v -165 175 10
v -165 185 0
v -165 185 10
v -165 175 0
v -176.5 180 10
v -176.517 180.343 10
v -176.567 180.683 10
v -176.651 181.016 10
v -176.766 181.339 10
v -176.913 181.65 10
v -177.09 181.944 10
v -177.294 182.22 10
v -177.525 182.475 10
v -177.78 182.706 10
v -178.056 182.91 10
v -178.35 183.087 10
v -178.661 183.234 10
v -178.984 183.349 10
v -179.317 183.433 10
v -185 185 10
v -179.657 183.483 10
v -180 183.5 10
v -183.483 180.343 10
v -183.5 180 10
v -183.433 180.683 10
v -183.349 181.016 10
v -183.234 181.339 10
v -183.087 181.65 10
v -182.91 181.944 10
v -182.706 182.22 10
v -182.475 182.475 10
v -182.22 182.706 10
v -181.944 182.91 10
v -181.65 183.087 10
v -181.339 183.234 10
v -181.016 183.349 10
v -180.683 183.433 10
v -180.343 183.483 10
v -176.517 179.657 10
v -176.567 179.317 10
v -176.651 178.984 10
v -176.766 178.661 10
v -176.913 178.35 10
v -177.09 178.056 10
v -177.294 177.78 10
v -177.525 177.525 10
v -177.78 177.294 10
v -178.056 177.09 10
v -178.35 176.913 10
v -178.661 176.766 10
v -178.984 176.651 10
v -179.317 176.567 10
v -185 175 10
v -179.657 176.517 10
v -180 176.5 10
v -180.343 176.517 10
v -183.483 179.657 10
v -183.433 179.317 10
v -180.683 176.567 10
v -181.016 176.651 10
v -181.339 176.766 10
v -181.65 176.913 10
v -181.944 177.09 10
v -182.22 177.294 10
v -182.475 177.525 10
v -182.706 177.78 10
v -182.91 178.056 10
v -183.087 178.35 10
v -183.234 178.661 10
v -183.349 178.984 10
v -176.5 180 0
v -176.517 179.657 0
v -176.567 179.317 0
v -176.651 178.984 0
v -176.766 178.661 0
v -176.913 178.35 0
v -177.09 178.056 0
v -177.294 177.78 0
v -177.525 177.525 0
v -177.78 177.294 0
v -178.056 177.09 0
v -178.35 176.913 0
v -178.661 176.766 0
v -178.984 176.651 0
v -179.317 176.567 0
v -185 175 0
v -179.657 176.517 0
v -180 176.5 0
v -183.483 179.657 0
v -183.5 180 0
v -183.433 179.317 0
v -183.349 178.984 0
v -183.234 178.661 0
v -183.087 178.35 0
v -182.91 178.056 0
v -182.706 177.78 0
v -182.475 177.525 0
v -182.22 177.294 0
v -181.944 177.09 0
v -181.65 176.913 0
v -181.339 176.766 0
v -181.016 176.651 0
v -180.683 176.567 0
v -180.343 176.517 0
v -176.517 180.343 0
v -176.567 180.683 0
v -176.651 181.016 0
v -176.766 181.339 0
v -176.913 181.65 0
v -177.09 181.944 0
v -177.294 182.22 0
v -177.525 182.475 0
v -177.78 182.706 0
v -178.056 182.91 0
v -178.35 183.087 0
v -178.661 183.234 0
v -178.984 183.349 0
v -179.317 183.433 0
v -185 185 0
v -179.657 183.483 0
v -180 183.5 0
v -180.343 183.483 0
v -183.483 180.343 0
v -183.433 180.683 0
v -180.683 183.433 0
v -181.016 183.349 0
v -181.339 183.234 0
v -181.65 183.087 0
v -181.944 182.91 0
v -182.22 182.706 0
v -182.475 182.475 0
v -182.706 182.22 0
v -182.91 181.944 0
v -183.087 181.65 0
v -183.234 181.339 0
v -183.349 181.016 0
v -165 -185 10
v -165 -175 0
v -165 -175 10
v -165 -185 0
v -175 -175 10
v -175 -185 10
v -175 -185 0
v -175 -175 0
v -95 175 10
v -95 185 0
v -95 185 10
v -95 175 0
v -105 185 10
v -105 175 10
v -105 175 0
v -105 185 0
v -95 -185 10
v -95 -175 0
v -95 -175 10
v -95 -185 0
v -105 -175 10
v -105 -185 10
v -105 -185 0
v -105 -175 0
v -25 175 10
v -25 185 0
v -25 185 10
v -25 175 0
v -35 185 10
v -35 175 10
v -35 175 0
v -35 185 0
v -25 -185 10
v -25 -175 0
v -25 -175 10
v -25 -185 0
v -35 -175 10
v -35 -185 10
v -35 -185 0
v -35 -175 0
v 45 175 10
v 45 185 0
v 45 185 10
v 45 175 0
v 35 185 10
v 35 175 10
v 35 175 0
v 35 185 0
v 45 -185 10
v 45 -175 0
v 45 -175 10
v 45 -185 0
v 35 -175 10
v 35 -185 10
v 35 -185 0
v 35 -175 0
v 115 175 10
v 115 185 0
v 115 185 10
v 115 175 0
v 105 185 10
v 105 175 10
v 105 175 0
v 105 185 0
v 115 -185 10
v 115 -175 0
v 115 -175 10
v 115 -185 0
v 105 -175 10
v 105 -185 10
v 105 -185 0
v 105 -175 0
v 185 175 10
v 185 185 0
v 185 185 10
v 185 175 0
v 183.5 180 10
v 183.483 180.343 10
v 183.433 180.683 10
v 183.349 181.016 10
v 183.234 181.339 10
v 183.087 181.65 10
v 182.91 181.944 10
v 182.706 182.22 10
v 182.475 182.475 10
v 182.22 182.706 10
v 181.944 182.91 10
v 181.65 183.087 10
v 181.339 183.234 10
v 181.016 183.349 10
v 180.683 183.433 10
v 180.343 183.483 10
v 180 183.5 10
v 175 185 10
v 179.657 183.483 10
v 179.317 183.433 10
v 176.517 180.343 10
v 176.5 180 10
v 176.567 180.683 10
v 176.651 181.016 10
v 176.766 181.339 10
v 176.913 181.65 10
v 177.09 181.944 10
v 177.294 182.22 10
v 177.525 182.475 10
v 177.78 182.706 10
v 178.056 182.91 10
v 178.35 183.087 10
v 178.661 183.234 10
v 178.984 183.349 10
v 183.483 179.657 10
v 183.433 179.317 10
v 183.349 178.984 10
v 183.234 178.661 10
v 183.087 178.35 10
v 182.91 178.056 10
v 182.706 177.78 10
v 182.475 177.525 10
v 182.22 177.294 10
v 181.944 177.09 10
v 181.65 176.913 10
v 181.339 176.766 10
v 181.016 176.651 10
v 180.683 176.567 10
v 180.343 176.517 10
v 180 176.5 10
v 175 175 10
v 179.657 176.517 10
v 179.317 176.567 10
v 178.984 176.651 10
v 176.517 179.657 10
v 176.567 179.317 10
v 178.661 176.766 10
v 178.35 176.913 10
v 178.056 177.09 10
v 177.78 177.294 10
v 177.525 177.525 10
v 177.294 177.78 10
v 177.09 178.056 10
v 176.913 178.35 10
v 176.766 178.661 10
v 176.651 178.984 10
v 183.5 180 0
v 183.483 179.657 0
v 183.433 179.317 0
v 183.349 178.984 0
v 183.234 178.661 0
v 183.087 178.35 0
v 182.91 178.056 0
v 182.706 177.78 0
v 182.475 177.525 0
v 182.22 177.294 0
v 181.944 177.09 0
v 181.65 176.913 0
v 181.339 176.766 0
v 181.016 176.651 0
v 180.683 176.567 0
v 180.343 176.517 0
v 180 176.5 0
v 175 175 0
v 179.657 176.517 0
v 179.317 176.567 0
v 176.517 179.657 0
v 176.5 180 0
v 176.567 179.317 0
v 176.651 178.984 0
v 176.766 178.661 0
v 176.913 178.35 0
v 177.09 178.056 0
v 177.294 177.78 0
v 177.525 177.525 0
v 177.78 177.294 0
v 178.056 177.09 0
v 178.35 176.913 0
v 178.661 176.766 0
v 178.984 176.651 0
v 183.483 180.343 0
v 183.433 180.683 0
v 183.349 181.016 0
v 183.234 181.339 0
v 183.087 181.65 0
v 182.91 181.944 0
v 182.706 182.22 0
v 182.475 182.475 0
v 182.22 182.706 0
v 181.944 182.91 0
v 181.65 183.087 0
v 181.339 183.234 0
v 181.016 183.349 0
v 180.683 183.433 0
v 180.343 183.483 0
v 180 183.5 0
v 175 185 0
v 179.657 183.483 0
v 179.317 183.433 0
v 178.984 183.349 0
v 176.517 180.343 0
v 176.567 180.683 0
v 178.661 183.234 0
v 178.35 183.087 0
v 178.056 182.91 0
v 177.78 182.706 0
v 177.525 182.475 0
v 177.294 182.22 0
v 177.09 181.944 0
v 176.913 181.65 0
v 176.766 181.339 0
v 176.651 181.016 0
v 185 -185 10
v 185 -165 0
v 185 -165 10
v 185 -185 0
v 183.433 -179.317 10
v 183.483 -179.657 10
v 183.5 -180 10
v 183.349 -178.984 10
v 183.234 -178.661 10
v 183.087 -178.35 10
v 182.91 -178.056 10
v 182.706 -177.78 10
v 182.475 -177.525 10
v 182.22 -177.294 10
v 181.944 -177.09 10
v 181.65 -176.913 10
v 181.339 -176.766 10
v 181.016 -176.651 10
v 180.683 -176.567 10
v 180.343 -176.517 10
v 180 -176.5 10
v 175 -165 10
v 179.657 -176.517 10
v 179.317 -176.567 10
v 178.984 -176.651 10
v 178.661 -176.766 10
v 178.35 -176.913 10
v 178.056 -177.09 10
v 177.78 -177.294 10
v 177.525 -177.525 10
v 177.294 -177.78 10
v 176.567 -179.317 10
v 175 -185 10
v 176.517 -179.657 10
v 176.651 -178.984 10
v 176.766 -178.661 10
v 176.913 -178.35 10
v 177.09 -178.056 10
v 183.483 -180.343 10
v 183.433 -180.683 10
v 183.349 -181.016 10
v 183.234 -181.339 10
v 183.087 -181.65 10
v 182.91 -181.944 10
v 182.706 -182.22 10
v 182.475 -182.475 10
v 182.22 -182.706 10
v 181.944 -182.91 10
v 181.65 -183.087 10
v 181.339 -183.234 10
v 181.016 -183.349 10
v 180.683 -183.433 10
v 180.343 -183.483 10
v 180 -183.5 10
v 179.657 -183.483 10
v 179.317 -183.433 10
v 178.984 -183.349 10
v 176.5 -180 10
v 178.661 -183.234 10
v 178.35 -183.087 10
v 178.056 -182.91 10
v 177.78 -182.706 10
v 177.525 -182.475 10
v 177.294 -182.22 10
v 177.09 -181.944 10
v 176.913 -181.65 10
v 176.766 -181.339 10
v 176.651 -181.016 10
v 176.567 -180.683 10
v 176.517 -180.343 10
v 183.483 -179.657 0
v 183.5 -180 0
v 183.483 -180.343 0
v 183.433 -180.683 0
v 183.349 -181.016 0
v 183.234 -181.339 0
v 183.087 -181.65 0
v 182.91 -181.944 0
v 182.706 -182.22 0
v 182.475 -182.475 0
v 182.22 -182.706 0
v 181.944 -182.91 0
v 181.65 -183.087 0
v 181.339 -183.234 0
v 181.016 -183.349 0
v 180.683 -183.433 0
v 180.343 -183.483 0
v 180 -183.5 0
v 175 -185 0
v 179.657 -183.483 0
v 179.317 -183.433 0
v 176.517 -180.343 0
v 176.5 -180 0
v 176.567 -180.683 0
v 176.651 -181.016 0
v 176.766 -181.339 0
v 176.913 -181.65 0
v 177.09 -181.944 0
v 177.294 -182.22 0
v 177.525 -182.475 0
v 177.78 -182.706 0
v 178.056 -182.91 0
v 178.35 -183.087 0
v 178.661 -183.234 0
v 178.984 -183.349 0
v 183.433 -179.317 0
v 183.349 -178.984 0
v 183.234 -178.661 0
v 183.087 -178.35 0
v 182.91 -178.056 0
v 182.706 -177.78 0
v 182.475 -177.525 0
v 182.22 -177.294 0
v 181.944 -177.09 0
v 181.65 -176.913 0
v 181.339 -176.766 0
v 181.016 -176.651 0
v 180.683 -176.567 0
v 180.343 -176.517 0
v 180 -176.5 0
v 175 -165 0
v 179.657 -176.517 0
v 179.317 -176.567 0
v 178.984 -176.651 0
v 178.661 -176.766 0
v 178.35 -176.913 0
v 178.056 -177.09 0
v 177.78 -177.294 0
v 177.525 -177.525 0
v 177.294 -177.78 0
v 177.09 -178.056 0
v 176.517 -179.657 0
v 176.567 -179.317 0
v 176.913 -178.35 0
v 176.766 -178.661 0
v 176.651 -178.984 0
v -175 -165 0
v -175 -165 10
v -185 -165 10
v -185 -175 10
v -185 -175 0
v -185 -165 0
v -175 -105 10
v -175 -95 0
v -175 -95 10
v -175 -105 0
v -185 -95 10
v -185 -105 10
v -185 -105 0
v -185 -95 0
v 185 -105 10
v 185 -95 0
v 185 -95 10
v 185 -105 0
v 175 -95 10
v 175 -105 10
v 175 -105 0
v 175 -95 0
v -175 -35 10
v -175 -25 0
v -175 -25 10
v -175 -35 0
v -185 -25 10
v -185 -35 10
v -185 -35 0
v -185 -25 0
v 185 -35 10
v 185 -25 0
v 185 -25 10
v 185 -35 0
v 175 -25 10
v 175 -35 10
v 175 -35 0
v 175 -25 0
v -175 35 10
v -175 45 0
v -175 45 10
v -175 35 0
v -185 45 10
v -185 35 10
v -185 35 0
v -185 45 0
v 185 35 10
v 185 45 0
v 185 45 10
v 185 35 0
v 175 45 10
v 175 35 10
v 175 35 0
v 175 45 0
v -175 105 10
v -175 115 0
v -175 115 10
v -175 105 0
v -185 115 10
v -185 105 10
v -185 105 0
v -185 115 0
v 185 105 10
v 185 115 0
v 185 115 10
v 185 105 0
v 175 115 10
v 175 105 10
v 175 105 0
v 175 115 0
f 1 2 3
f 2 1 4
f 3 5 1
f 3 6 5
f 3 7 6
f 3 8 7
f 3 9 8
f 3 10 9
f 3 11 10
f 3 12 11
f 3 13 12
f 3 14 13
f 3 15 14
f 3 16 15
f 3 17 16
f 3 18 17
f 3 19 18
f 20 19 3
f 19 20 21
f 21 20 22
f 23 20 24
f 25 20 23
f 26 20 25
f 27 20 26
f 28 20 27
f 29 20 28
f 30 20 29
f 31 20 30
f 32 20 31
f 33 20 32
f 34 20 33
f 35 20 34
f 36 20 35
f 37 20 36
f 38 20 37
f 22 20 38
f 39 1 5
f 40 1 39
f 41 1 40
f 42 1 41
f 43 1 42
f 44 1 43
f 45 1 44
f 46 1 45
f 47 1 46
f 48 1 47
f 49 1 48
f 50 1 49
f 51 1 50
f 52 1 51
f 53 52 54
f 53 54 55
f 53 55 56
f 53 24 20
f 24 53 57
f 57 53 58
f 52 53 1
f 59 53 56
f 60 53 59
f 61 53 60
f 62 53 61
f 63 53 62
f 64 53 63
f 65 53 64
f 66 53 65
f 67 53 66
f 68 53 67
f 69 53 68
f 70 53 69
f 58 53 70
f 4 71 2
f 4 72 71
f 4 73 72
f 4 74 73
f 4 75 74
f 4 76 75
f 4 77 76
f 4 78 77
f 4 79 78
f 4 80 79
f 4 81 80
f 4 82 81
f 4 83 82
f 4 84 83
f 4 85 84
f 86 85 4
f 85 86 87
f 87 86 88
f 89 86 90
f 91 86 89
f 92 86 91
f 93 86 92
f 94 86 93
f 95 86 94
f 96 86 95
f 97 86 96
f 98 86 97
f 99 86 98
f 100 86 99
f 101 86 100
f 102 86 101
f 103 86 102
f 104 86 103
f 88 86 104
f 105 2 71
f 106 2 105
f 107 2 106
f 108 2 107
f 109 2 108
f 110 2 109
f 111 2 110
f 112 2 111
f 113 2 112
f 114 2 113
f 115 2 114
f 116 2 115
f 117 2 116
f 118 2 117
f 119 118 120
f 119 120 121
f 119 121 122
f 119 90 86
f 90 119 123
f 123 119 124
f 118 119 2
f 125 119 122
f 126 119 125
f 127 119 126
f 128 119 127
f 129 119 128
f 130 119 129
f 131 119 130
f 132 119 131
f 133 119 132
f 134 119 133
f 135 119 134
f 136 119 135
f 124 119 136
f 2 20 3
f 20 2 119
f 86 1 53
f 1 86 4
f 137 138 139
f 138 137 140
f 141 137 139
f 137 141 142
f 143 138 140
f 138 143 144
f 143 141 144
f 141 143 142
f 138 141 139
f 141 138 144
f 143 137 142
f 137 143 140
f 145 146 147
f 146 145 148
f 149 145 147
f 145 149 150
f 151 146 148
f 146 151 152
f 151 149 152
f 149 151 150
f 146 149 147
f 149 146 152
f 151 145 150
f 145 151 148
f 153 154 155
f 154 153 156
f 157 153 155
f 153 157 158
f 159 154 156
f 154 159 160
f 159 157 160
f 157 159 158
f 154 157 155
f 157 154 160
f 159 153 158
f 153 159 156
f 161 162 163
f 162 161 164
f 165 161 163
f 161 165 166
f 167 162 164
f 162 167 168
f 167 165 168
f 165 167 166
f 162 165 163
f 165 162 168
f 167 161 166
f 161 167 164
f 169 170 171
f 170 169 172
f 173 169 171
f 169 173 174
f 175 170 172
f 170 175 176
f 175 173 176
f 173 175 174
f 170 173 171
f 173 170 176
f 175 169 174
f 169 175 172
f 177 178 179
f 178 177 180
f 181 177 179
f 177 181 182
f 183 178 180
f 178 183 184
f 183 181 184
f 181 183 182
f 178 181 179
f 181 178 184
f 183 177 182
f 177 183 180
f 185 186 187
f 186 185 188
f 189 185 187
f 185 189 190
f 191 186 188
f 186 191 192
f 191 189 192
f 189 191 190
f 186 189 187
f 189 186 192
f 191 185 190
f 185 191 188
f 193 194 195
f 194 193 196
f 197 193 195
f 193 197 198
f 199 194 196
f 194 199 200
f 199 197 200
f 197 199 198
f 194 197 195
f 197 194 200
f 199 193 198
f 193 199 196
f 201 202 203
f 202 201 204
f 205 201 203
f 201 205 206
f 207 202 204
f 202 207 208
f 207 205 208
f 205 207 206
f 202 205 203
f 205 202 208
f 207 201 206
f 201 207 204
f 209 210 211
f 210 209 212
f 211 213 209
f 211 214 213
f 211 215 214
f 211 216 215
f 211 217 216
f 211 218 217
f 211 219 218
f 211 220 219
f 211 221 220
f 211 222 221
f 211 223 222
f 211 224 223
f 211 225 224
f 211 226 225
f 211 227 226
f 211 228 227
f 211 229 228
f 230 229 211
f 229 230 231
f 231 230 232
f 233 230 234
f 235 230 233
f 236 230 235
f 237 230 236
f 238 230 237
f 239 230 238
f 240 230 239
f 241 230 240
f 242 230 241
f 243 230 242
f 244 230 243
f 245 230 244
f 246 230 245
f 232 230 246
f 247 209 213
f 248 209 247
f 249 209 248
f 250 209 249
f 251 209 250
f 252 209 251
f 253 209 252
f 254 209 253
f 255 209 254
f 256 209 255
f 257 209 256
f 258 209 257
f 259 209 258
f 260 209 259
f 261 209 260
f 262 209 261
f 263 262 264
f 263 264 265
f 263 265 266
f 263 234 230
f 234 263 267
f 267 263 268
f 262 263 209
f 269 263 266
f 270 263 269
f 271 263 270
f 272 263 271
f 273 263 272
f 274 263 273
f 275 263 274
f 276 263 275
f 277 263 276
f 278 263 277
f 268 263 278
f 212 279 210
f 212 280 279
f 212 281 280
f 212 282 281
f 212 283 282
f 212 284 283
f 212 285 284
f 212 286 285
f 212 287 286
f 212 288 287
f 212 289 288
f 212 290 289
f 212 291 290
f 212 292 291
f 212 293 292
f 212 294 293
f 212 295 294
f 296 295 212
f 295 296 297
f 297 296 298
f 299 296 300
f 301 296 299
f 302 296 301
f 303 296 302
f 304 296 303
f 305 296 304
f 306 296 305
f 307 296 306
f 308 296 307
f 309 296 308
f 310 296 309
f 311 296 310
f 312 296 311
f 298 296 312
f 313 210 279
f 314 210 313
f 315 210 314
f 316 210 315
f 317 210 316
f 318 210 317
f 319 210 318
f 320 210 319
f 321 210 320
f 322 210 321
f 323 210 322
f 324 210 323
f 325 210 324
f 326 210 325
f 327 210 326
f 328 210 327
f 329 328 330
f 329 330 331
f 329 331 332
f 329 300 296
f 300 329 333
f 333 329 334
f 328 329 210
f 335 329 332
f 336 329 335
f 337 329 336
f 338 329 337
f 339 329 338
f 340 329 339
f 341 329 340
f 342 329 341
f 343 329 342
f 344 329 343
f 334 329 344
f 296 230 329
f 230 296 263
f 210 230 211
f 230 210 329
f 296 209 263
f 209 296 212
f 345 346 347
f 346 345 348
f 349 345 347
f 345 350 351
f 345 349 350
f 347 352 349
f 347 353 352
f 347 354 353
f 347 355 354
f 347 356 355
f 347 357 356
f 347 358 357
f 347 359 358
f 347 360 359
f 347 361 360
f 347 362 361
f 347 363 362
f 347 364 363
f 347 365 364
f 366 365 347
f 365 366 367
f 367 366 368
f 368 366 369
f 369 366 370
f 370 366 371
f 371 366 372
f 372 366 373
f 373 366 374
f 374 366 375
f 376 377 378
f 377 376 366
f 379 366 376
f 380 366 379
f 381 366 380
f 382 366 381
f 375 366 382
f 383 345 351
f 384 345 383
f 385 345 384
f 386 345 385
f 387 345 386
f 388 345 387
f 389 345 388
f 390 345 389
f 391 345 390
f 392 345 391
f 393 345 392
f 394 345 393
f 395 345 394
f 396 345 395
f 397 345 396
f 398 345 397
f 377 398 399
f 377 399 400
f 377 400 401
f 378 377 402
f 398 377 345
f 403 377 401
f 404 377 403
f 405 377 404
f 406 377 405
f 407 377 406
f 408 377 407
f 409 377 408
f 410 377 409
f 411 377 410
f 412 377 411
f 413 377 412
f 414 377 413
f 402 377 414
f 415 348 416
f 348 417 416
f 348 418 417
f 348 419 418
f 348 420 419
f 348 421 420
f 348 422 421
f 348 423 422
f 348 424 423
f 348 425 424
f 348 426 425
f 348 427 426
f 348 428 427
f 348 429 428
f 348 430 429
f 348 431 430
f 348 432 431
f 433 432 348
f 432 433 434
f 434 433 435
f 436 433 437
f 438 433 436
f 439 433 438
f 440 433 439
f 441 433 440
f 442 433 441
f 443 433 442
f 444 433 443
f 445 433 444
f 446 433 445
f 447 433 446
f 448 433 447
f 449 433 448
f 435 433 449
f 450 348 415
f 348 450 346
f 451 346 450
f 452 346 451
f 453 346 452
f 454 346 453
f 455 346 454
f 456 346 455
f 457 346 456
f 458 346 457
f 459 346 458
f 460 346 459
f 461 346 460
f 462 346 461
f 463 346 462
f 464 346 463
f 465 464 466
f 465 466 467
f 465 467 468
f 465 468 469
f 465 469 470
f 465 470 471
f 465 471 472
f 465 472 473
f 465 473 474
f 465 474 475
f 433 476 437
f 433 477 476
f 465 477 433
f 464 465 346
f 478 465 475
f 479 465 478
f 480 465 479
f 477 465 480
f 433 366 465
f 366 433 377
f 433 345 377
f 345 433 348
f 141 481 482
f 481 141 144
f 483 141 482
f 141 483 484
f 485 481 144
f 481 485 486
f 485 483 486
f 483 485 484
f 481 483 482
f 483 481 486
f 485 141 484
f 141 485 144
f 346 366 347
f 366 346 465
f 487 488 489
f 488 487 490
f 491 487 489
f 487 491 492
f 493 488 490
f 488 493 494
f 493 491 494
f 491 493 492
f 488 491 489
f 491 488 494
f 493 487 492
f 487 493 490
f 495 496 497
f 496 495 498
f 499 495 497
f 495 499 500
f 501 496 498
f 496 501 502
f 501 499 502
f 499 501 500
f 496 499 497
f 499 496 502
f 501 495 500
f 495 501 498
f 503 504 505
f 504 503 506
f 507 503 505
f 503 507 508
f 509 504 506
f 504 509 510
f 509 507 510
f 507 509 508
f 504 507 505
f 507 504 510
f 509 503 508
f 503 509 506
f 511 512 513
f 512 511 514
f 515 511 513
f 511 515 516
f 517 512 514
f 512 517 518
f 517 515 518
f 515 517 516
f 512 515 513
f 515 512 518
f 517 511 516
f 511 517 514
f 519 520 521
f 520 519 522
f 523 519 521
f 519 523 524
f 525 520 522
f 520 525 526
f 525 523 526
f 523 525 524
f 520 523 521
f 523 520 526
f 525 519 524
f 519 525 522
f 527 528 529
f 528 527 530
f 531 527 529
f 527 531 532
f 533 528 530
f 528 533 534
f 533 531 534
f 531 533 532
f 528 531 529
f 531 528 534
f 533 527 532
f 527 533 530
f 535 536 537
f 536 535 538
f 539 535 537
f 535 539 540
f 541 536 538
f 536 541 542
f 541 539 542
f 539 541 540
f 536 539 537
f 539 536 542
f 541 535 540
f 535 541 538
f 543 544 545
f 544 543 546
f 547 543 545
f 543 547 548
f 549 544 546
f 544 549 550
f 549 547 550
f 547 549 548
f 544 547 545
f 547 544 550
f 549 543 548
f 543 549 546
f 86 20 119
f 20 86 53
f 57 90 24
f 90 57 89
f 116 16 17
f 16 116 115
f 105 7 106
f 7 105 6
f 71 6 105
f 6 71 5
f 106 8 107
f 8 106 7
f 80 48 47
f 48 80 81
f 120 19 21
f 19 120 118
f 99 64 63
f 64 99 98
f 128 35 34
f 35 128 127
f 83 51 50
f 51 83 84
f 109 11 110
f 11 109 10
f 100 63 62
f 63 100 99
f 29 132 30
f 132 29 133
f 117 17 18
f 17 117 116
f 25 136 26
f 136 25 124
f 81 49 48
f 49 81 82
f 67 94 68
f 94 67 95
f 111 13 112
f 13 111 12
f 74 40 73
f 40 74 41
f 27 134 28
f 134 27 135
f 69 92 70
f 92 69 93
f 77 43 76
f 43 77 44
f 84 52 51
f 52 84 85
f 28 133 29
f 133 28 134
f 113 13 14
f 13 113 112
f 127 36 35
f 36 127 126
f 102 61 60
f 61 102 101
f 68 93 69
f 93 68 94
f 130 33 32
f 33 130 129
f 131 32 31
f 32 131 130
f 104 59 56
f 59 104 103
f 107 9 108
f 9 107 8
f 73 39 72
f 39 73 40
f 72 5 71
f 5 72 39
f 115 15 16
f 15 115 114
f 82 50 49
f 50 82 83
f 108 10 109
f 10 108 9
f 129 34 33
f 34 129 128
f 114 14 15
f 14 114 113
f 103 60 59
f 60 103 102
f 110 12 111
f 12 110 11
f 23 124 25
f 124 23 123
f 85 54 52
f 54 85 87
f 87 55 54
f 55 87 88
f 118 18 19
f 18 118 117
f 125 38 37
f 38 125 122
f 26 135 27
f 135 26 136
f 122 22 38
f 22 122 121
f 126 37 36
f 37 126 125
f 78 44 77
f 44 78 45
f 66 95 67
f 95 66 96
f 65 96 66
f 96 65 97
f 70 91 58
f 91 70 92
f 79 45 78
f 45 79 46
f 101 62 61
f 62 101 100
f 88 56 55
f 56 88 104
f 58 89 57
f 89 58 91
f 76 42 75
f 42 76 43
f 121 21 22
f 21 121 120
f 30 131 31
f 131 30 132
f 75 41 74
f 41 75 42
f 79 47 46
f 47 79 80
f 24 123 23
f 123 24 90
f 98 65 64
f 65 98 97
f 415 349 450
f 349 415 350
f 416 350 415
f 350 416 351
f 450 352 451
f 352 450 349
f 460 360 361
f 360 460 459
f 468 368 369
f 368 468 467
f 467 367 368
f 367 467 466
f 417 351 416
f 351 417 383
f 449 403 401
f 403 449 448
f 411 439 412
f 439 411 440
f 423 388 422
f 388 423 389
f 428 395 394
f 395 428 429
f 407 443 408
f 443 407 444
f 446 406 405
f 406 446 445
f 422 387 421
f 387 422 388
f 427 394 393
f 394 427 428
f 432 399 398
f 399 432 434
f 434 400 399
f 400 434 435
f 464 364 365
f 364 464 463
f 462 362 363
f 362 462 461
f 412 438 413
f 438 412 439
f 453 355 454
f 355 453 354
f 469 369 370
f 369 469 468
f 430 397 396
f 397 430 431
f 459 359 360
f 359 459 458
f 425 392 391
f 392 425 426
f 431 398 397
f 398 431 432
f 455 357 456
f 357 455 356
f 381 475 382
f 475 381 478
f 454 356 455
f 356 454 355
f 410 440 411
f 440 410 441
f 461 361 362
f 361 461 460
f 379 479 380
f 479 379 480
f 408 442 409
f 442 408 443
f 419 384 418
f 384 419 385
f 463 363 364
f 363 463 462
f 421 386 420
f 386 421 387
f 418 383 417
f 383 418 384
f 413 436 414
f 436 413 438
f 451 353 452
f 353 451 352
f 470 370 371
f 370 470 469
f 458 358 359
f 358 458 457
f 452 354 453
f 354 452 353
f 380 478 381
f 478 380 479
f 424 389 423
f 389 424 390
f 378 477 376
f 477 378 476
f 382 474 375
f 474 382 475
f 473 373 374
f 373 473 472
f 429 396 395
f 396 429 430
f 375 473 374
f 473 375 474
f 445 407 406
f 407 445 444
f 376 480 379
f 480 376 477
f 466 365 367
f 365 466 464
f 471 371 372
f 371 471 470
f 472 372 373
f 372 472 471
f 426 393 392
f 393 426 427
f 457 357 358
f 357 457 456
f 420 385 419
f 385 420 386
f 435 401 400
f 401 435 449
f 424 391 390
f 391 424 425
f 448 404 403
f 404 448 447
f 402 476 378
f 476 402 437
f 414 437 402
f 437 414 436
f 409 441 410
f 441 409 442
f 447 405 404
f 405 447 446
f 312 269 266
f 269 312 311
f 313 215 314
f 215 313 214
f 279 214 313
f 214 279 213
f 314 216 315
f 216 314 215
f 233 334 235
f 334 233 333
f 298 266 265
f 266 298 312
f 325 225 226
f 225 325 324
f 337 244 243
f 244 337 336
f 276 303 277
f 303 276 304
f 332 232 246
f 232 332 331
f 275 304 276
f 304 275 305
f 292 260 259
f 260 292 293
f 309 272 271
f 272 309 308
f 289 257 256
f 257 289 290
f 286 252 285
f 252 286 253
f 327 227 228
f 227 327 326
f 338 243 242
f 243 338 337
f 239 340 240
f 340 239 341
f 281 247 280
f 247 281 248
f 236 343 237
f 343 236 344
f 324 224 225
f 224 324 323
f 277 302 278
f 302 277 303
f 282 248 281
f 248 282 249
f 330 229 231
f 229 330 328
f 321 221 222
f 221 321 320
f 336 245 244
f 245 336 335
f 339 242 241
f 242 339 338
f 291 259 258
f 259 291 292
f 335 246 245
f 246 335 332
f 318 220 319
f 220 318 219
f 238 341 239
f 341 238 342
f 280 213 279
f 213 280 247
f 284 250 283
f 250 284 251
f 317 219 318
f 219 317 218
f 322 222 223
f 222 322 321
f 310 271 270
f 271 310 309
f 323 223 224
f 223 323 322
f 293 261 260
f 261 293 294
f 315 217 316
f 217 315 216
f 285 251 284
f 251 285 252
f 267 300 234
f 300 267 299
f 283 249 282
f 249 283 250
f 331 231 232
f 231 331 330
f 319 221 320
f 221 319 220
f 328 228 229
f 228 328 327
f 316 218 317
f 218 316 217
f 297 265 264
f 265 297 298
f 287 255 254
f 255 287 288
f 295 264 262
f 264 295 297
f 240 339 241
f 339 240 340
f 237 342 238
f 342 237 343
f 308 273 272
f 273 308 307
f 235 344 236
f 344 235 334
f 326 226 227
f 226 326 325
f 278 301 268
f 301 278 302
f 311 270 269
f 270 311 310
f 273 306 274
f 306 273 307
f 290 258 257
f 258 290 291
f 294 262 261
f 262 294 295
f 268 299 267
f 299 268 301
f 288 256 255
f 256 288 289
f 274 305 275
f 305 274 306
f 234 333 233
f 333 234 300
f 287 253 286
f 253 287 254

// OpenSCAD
// ring_65.scad - ring index 65 (z bottom = 650 mm)
$fn = 64; bar = 10; half_b = bar/2; outer = 370; half_outer = outer/2;
front_y = 180; back_y = -180; left_x = -180; right_x = 180;
x_centers = [-170, -100, -30, 40, 110, 180];
z_centers = [5, 85, 155, 225, 295, 365, 435, 505, 575, 645, 715]; ring_z = 650;
module place_box(cx, cy, sx, sy) { translate([cx - sx/2, cy - sy/2, 0]) cube([sx, sy, bar]); }

difference() { union() {
    for (x = x_centers) { place_box(x, front_y, bar, bar); place_box(x, back_y, bar, bar); }
    for (y = x_centers) { place_box(left_x, y, bar, bar); place_box(right_x, y, bar, bar); }
    for (zc = z_centers) if ((zc - half_b < ring_z + bar) && (zc + half_b > ring_z)) {
        translate([-half_outer, front_y - half_b, 0]) cube([outer, bar, bar]);
        translate([-half_outer, back_y - half_b, 0])  cube([outer, bar, bar]);
        translate([left_x - half_b, -half_outer, 0])  cube([bar, outer, bar]);
        translate([right_x - half_b, -half_outer, 0]) cube([bar, outer, bar]);
    }
  }
  for (cx = [-180, 180]) for (cy = [-180, 180]) translate([cx, cy, 0]) cylinder(h = bar, r = 3.5, $fn = 64);
}
